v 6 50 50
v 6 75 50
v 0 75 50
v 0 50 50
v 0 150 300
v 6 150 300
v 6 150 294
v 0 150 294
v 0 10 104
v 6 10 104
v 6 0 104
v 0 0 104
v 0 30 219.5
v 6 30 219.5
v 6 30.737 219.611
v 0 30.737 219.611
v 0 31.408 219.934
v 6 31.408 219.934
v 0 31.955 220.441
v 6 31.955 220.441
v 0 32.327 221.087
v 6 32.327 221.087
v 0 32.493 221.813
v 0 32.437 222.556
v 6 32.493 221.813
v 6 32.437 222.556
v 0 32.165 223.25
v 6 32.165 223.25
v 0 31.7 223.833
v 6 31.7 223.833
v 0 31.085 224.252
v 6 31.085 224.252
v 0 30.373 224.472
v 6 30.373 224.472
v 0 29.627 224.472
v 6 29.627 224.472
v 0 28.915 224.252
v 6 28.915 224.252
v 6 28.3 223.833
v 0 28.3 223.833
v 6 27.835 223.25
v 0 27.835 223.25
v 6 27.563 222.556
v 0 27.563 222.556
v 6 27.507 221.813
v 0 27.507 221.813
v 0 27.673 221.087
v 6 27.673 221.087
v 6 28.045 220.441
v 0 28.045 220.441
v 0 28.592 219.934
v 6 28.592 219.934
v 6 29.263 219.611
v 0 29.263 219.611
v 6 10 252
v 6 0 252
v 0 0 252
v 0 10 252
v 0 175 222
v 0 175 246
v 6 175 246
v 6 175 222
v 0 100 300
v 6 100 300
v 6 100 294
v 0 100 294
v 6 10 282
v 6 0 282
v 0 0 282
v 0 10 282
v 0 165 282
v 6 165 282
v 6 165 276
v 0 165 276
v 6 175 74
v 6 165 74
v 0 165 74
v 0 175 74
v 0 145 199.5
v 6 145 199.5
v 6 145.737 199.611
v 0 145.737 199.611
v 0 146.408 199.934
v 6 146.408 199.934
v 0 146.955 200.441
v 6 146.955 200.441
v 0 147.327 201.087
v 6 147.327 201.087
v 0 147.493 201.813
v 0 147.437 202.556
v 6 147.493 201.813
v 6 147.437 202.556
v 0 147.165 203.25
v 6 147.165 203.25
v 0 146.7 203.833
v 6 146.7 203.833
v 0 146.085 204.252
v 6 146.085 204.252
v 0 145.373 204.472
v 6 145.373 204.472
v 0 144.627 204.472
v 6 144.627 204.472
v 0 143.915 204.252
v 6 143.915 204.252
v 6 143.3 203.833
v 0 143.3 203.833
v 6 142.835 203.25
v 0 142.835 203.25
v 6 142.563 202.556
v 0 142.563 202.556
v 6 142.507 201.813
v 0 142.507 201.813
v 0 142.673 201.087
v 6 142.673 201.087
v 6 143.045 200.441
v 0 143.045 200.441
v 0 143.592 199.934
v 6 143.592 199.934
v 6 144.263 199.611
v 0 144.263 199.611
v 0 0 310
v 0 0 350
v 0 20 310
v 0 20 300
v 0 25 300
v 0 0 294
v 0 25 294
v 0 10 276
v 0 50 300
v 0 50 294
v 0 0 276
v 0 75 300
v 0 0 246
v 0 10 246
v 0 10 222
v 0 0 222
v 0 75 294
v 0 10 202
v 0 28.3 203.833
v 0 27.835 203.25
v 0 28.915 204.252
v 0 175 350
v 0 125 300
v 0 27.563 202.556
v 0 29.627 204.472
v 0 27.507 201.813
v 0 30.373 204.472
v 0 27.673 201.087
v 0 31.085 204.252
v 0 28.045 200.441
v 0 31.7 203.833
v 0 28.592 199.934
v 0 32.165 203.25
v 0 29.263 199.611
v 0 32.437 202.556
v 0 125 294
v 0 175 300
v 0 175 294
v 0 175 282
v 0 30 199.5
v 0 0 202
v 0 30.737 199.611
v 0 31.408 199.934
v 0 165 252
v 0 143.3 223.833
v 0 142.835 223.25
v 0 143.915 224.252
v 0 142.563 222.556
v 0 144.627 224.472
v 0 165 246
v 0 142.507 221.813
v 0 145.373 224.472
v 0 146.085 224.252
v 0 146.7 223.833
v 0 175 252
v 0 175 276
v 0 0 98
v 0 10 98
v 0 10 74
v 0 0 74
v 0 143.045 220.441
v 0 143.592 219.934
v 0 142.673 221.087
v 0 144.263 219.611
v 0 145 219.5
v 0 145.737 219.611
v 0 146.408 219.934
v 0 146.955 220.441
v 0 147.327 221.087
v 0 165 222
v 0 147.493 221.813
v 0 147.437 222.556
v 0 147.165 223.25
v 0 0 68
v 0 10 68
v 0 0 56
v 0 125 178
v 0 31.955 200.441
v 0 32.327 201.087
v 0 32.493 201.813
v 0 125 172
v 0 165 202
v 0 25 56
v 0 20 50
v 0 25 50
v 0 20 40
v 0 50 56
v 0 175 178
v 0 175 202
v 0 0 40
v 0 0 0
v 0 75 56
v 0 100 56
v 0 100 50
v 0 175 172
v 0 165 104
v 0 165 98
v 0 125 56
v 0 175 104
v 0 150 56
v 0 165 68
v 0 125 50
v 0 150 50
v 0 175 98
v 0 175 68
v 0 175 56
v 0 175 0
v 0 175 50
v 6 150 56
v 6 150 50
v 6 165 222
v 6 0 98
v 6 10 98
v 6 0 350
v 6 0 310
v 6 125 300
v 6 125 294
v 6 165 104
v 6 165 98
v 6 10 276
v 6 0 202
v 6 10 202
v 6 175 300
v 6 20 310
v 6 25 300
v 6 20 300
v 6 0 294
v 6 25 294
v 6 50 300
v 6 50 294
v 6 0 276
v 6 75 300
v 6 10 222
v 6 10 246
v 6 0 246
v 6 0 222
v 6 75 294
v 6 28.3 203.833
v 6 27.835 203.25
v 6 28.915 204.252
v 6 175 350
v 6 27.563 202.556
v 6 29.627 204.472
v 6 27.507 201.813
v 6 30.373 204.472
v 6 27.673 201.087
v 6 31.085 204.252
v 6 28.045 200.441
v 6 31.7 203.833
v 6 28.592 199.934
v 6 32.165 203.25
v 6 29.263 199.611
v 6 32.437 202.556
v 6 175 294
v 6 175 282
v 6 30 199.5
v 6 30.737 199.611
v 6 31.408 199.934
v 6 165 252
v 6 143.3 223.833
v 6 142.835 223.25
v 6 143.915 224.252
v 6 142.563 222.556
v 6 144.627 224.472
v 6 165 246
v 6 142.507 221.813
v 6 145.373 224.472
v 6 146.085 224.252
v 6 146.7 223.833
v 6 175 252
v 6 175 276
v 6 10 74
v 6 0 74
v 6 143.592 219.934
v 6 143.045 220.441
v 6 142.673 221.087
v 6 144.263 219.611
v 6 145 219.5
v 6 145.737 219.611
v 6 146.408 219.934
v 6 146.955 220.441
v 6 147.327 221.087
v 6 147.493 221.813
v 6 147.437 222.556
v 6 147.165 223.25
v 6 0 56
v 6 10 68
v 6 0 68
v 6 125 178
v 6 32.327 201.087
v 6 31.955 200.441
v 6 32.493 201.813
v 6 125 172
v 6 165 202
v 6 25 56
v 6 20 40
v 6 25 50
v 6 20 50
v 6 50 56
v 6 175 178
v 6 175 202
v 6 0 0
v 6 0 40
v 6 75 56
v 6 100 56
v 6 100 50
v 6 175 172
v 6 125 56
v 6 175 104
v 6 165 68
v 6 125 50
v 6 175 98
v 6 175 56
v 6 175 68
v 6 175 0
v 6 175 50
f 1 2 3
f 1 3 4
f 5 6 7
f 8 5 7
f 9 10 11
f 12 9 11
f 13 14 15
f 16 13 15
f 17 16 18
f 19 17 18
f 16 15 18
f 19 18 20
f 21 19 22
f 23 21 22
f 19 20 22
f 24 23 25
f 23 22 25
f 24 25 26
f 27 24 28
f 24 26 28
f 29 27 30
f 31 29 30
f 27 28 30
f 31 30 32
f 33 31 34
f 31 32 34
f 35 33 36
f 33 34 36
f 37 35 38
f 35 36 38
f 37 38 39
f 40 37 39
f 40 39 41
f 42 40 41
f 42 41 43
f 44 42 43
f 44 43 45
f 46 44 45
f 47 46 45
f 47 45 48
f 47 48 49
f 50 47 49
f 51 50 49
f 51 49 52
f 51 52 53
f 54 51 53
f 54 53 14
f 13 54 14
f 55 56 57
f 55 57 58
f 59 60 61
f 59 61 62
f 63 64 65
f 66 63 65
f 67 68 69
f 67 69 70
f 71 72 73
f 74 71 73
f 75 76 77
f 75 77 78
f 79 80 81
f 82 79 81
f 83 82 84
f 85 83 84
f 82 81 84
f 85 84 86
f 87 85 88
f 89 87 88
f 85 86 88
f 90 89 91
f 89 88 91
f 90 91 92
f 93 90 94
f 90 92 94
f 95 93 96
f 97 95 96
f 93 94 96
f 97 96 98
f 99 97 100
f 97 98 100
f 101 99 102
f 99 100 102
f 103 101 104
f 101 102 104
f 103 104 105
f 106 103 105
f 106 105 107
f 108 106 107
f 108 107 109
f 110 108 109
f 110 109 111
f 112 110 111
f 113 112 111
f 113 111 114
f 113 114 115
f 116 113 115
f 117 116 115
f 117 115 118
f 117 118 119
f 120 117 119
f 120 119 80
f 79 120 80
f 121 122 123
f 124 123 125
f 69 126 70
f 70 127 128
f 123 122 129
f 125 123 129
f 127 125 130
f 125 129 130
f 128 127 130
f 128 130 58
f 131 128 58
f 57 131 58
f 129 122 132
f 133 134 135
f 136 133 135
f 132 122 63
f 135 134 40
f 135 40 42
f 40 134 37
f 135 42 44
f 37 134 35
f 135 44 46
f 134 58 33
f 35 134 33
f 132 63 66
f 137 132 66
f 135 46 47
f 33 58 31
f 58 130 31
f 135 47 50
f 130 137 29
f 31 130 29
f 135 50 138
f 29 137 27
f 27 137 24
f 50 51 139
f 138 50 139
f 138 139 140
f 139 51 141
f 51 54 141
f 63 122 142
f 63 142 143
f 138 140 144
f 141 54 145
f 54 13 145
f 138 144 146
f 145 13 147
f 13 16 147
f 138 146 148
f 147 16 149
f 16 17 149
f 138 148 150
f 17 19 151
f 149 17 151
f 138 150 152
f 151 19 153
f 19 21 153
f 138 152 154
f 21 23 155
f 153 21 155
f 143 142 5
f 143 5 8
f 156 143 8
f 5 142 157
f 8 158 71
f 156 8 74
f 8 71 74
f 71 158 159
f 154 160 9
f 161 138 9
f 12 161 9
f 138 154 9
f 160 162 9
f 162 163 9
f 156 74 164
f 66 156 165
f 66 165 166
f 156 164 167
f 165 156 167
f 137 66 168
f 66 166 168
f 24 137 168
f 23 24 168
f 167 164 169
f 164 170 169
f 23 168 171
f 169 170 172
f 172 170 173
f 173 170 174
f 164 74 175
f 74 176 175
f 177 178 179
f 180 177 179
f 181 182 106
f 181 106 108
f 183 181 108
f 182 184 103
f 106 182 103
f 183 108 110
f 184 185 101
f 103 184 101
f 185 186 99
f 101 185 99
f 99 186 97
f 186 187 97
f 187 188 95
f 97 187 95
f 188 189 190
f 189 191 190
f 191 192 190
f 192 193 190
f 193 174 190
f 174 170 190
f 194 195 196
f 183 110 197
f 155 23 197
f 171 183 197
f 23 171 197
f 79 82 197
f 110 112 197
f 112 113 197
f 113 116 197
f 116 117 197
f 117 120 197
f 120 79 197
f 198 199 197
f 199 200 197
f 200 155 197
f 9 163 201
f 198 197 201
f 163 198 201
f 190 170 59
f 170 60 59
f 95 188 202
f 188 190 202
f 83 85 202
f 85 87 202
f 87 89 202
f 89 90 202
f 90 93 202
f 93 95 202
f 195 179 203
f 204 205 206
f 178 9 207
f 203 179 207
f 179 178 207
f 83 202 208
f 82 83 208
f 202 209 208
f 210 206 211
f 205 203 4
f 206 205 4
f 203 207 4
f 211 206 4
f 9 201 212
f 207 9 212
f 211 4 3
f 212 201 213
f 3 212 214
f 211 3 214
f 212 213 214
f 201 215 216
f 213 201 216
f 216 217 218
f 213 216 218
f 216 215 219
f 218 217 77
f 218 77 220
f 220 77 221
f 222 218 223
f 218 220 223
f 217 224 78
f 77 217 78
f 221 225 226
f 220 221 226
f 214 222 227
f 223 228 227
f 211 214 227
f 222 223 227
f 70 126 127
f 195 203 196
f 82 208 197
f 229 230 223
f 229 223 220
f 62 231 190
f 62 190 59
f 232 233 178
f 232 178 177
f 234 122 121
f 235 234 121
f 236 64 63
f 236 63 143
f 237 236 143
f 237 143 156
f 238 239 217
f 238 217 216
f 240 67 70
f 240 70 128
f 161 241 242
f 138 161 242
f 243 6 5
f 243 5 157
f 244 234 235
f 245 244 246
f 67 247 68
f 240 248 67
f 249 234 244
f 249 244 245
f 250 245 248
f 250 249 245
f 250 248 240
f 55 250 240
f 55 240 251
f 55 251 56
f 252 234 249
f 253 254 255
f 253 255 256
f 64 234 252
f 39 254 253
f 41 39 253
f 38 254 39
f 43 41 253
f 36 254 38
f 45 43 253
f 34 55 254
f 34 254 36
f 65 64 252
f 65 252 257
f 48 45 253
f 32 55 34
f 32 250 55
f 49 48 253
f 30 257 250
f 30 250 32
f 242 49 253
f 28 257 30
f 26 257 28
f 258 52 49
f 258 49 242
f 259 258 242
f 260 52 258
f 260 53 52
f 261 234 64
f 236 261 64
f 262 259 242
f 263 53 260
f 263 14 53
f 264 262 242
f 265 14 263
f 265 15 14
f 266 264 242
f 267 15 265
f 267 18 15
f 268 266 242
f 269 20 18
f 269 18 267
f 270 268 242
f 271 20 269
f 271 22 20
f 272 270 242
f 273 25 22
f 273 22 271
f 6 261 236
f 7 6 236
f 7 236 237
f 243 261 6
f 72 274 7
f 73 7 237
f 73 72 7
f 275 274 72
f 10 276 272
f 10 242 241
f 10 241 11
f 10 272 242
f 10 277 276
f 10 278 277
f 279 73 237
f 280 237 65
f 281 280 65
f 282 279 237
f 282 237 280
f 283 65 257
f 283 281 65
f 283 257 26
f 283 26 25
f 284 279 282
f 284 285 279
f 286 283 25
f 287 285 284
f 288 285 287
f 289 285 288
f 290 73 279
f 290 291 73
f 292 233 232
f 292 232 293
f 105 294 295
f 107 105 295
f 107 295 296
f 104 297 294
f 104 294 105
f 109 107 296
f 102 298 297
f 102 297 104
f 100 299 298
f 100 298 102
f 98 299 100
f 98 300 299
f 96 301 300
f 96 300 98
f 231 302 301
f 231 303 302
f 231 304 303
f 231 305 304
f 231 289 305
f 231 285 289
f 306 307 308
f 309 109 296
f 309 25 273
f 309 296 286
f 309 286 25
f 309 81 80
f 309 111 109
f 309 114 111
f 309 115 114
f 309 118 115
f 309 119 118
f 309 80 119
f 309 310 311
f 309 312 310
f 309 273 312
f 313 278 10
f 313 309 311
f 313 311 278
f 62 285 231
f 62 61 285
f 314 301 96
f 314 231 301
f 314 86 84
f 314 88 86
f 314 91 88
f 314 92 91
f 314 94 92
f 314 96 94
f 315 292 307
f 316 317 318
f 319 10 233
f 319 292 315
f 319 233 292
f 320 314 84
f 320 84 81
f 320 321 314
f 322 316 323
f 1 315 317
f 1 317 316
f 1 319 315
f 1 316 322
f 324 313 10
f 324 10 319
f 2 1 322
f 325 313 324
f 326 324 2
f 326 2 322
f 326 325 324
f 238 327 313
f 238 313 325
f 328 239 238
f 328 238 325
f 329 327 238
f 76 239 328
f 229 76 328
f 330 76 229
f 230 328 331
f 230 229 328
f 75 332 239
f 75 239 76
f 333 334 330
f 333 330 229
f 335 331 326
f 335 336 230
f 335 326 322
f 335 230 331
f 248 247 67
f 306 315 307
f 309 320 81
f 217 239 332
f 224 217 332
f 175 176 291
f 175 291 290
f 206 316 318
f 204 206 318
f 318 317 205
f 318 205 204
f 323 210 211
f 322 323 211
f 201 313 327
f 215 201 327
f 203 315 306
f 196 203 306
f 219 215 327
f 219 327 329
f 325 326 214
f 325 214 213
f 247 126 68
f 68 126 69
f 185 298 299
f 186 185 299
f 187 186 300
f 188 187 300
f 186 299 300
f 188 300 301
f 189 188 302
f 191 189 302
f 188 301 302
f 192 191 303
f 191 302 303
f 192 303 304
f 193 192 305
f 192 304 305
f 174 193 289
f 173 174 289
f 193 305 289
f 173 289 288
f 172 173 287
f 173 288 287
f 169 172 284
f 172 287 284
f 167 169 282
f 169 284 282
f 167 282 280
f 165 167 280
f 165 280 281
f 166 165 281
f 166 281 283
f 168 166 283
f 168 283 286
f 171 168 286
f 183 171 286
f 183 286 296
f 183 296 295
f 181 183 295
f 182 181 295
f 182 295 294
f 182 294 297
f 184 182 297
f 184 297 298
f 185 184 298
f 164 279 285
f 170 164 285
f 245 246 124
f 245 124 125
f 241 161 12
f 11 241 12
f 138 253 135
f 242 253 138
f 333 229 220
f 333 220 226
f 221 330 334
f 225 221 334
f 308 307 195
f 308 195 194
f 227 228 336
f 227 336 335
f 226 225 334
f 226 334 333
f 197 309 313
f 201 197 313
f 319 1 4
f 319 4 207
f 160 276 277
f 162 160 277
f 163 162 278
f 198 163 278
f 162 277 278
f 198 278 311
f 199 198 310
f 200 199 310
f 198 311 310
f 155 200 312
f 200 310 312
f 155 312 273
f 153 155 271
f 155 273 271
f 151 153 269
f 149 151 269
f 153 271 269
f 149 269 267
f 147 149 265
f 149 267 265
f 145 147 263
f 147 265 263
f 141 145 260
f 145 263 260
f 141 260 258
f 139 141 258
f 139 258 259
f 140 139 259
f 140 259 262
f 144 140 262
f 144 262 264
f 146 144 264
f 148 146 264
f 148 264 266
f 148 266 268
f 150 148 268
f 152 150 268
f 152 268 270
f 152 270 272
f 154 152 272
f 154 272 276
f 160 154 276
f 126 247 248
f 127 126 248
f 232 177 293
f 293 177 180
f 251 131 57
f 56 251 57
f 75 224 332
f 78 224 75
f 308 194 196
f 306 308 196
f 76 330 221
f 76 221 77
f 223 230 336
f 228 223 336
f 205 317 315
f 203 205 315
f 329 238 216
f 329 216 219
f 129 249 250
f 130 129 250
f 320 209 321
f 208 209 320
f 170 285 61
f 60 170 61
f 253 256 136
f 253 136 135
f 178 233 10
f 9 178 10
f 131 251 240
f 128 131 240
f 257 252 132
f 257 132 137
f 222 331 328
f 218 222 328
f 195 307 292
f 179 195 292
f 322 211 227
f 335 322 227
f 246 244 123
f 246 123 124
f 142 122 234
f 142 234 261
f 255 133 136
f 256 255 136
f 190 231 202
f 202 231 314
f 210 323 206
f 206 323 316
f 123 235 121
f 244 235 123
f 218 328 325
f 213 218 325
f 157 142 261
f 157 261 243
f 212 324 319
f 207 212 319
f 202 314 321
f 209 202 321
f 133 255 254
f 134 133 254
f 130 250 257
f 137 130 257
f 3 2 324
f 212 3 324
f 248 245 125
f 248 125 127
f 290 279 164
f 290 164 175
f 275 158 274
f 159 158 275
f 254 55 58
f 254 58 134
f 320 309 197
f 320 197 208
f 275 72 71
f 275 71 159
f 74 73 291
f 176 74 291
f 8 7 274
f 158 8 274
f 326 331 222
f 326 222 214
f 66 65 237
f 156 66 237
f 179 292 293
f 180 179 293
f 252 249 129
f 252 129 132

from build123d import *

# Parameters (mm, degrees)
SKETCH1_W               = 350
SKETCH1_H               = 175
BOSS_EXTRUDE1_DEPTH     = 6
SKETCH3_W               = 6
SKETCH3_H               = 25
CUT_EXTRUDE1_DEPTH      = 392.357892472
LPATTERN1_COUNT         = 4
LPATTERN1_PITCH         = 50
SKETCH4_W               = 6
SKETCH4_H               = 10
CUT_EXTRUDE2_DEPTH      = 392.357892472
LPATTERN2_COUNT         = 2
LPATTERN2_PITCH         = 165
SKETCH5_W               = 6
SKETCH5_H               = 10
CUT_EXTRUDE3_DEPTH      = 392.357892472
LPATTERN3_COUNT         = 2
LPATTERN3_PITCH         = 165
SKETCH6_W               = 6
SKETCH6_H               = 50
CUT_EXTRUDE4_DEPTH      = 10
SKETCH7_W               = 20
SKETCH7_H               = 10
CUT_EXTRUDE5_DEPTH      = 10
LPATTERN4_COUNT         = 2
LPATTERN4_PITCH         = 165
SKETCH8_R               = 2.5
CUT_EXTRUDE6_DEPTH      = 10
SKETCH9_W               = 10
SKETCH9_H               = 20
CUT_EXTRUDE7_DEPTH      = 10
MIRROR1_COPY_1_SKETCH_W = 6
MIRROR1_COPY_1_SKETCH_H = 25
MIRROR1_COPY_1_DEPTH    = 392.357892472
MIRROR1_COPY_2_SKETCH_W = 6
MIRROR1_COPY_2_SKETCH_H = 25
MIRROR1_COPY_2_DEPTH    = 392.357892472
MIRROR1_COPY_3_SKETCH_W = 6
MIRROR1_COPY_3_SKETCH_H = 25
MIRROR1_COPY_3_DEPTH    = 392.357892472
MIRROR1_COPY_4_SKETCH_W = 6
MIRROR1_COPY_4_SKETCH_H = 10
MIRROR1_COPY_4_DEPTH    = 392.357892472
MIRROR1_COPY_5_SKETCH_W = 6
MIRROR1_COPY_5_SKETCH_H = 10
MIRROR1_COPY_5_DEPTH    = 392.357892472


with BuildPart() as part:
    # Sketch1 → Boss-Extrude1 (new body)
    with BuildSketch(Plane(origin=(0, 0, 0), x_dir=(0, 0, -1), z_dir=(1, 0, 0))):
        with Locations((-175, 87.5)):
            Rectangle(SKETCH1_W, SKETCH1_H)
    extrude(amount=BOSS_EXTRUDE1_DEPTH)

    # Sketch3 → Cut-Extrude1 (cut, through all)
    with BuildSketch(Plane(origin=(6, 0, 0), x_dir=(0, 0, -1), z_dir=(1, 0, 0))):
        with Locations((-297, 162.5)):
            Rectangle(SKETCH3_W, SKETCH3_H)
    cut_extrude1 = extrude(amount=-CUT_EXTRUDE1_DEPTH, mode=Mode.SUBTRACT)

    # LPattern1: Cut-Extrude1 ×4
    with Locations(*[(0, -i * LPATTERN1_PITCH, 0) for i in range(1, LPATTERN1_COUNT)]):
        add(cut_extrude1, mode=Mode.SUBTRACT)

    # Sketch4 → Cut-Extrude2 (cut, through all)
    with BuildSketch(Plane(origin=(6, 0, 0), x_dir=(0, 0, -1), z_dir=(1, 0, 0))):
        with Locations((-279, 170)):
            Rectangle(SKETCH4_W, SKETCH4_H)
    cut_extrude2 = extrude(amount=-CUT_EXTRUDE2_DEPTH, mode=Mode.SUBTRACT)

    # LPattern2: Cut-Extrude2 ×2
    with Locations(*[(0, -i * LPATTERN2_PITCH, 0) for i in range(1, LPATTERN2_COUNT)]):
        add(cut_extrude2, mode=Mode.SUBTRACT)

    # Sketch5 → Cut-Extrude3 (cut, through all)
    with BuildSketch(Plane(origin=(6, 0, 0), x_dir=(0, 0, -1), z_dir=(1, 0, 0))):
        with Locations((-249, 170)):
            Rectangle(SKETCH5_W, SKETCH5_H)
    cut_extrude3 = extrude(amount=-CUT_EXTRUDE3_DEPTH, mode=Mode.SUBTRACT)

    # LPattern3: Cut-Extrude3 ×2
    with Locations(*[(0, -i * LPATTERN3_PITCH, 0) for i in range(1, LPATTERN3_COUNT)]):
        add(cut_extrude3, mode=Mode.SUBTRACT)

    # Sketch6 → Cut-Extrude4 (cut)
    with BuildSketch(Plane(origin=(6, 0, 0), x_dir=(0, 0, -1), z_dir=(1, 0, 0))):
        with Locations((-175, 150)):
            Rectangle(SKETCH6_W, SKETCH6_H)
    extrude(amount=-CUT_EXTRUDE4_DEPTH, mode=Mode.SUBTRACT)

    # Sketch7 → Cut-Extrude5 (cut)
    with BuildSketch(Plane(origin=(6, 0, 0), x_dir=(0, 0, -1), z_dir=(1, 0, 0))):
        with Locations((-212, 170)):
            Rectangle(SKETCH7_W, SKETCH7_H)
    cut_extrude5 = extrude(amount=-CUT_EXTRUDE5_DEPTH, mode=Mode.SUBTRACT)

    # LPattern4: Cut-Extrude5 ×2
    with Locations(*[(0, -i * LPATTERN4_PITCH, 0) for i in range(1, LPATTERN4_COUNT)]):
        add(cut_extrude5, mode=Mode.SUBTRACT)

    # Sketch8 → Cut-Extrude6 (cut)
    with BuildSketch(Plane(origin=(6, 0, 0), x_dir=(0, 0, -1), z_dir=(1, 0, 0))):
        with Locations((-222, 145)):
            Circle(SKETCH8_R)
        with Locations((-202, 145)):
            Circle(SKETCH8_R)
        with Locations((-222, 30)):
            Circle(SKETCH8_R)
        with Locations((-202, 30)):
            Circle(SKETCH8_R)
    extrude(amount=-CUT_EXTRUDE6_DEPTH, mode=Mode.SUBTRACT)

    # Sketch9 → Cut-Extrude7 (cut)
    with BuildSketch(Plane(origin=(6, 0, 0), x_dir=(0, 0, -1), z_dir=(1, 0, 0))):
        with Locations((-305, 10)):
            Rectangle(SKETCH9_W, SKETCH9_H)
    cut_extrude7 = extrude(amount=-CUT_EXTRUDE7_DEPTH, mode=Mode.SUBTRACT)

    # Mirror1: Cut-Extrude1, Cut-Extrude2, Cut-Extrude3, Cut-Extrude7 across plane
    add(cut_extrude1.mirror(Plane.XY.offset(175)), mode=Mode.SUBTRACT)
    add(cut_extrude2.mirror(Plane.XY.offset(175)), mode=Mode.SUBTRACT)
    add(cut_extrude3.mirror(Plane.XY.offset(175)), mode=Mode.SUBTRACT)
    add(cut_extrude7.mirror(Plane.XY.offset(175)), mode=Mode.SUBTRACT)

    # Mirror1 copy 1 sketch → Mirror1 copy 1 (cut, through all)
    with BuildSketch(Plane(origin=(6, -50, 350), x_dir=(0, 0, 1), z_dir=(1, 0, 0))):
        with Locations((-297, -162.5)):
            Rectangle(MIRROR1_COPY_1_SKETCH_W, MIRROR1_COPY_1_SKETCH_H)
    extrude(amount=-MIRROR1_COPY_1_DEPTH, mode=Mode.SUBTRACT)

    # Mirror1 copy 2 sketch → Mirror1 copy 2 (cut, through all)
    with BuildSketch(Plane(origin=(6, -100, 350), x_dir=(0, 0, 1), z_dir=(1, 0, 0))):
        with Locations((-297, -162.5)):
            Rectangle(MIRROR1_COPY_2_SKETCH_W, MIRROR1_COPY_2_SKETCH_H)
    extrude(amount=-MIRROR1_COPY_2_DEPTH, mode=Mode.SUBTRACT)

    # Mirror1 copy 3 sketch → Mirror1 copy 3 (cut, through all)
    with BuildSketch(Plane(origin=(6, -150, 350), x_dir=(0, 0, 1), z_dir=(1, 0, 0))):
        with Locations((-297, -162.5)):
            Rectangle(MIRROR1_COPY_3_SKETCH_W, MIRROR1_COPY_3_SKETCH_H)
    extrude(amount=-MIRROR1_COPY_3_DEPTH, mode=Mode.SUBTRACT)

    # Mirror1 copy 4 sketch → Mirror1 copy 4 (cut, through all)
    with BuildSketch(Plane(origin=(6, -165, 350), x_dir=(0, 0, 1), z_dir=(1, 0, 0))):
        with Locations((-279, -170)):
            Rectangle(MIRROR1_COPY_4_SKETCH_W, MIRROR1_COPY_4_SKETCH_H)
    extrude(amount=-MIRROR1_COPY_4_DEPTH, mode=Mode.SUBTRACT)

    # Mirror1 copy 5 sketch → Mirror1 copy 5 (cut, through all)
    with BuildSketch(Plane(origin=(6, -165, 350), x_dir=(0, 0, 1), z_dir=(1, 0, 0))):
        with Locations((-249, -170)):
            Rectangle(MIRROR1_COPY_5_SKETCH_W, MIRROR1_COPY_5_SKETCH_H)
    extrude(amount=-MIRROR1_COPY_5_DEPTH, mode=Mode.SUBTRACT)


solid = part.part
